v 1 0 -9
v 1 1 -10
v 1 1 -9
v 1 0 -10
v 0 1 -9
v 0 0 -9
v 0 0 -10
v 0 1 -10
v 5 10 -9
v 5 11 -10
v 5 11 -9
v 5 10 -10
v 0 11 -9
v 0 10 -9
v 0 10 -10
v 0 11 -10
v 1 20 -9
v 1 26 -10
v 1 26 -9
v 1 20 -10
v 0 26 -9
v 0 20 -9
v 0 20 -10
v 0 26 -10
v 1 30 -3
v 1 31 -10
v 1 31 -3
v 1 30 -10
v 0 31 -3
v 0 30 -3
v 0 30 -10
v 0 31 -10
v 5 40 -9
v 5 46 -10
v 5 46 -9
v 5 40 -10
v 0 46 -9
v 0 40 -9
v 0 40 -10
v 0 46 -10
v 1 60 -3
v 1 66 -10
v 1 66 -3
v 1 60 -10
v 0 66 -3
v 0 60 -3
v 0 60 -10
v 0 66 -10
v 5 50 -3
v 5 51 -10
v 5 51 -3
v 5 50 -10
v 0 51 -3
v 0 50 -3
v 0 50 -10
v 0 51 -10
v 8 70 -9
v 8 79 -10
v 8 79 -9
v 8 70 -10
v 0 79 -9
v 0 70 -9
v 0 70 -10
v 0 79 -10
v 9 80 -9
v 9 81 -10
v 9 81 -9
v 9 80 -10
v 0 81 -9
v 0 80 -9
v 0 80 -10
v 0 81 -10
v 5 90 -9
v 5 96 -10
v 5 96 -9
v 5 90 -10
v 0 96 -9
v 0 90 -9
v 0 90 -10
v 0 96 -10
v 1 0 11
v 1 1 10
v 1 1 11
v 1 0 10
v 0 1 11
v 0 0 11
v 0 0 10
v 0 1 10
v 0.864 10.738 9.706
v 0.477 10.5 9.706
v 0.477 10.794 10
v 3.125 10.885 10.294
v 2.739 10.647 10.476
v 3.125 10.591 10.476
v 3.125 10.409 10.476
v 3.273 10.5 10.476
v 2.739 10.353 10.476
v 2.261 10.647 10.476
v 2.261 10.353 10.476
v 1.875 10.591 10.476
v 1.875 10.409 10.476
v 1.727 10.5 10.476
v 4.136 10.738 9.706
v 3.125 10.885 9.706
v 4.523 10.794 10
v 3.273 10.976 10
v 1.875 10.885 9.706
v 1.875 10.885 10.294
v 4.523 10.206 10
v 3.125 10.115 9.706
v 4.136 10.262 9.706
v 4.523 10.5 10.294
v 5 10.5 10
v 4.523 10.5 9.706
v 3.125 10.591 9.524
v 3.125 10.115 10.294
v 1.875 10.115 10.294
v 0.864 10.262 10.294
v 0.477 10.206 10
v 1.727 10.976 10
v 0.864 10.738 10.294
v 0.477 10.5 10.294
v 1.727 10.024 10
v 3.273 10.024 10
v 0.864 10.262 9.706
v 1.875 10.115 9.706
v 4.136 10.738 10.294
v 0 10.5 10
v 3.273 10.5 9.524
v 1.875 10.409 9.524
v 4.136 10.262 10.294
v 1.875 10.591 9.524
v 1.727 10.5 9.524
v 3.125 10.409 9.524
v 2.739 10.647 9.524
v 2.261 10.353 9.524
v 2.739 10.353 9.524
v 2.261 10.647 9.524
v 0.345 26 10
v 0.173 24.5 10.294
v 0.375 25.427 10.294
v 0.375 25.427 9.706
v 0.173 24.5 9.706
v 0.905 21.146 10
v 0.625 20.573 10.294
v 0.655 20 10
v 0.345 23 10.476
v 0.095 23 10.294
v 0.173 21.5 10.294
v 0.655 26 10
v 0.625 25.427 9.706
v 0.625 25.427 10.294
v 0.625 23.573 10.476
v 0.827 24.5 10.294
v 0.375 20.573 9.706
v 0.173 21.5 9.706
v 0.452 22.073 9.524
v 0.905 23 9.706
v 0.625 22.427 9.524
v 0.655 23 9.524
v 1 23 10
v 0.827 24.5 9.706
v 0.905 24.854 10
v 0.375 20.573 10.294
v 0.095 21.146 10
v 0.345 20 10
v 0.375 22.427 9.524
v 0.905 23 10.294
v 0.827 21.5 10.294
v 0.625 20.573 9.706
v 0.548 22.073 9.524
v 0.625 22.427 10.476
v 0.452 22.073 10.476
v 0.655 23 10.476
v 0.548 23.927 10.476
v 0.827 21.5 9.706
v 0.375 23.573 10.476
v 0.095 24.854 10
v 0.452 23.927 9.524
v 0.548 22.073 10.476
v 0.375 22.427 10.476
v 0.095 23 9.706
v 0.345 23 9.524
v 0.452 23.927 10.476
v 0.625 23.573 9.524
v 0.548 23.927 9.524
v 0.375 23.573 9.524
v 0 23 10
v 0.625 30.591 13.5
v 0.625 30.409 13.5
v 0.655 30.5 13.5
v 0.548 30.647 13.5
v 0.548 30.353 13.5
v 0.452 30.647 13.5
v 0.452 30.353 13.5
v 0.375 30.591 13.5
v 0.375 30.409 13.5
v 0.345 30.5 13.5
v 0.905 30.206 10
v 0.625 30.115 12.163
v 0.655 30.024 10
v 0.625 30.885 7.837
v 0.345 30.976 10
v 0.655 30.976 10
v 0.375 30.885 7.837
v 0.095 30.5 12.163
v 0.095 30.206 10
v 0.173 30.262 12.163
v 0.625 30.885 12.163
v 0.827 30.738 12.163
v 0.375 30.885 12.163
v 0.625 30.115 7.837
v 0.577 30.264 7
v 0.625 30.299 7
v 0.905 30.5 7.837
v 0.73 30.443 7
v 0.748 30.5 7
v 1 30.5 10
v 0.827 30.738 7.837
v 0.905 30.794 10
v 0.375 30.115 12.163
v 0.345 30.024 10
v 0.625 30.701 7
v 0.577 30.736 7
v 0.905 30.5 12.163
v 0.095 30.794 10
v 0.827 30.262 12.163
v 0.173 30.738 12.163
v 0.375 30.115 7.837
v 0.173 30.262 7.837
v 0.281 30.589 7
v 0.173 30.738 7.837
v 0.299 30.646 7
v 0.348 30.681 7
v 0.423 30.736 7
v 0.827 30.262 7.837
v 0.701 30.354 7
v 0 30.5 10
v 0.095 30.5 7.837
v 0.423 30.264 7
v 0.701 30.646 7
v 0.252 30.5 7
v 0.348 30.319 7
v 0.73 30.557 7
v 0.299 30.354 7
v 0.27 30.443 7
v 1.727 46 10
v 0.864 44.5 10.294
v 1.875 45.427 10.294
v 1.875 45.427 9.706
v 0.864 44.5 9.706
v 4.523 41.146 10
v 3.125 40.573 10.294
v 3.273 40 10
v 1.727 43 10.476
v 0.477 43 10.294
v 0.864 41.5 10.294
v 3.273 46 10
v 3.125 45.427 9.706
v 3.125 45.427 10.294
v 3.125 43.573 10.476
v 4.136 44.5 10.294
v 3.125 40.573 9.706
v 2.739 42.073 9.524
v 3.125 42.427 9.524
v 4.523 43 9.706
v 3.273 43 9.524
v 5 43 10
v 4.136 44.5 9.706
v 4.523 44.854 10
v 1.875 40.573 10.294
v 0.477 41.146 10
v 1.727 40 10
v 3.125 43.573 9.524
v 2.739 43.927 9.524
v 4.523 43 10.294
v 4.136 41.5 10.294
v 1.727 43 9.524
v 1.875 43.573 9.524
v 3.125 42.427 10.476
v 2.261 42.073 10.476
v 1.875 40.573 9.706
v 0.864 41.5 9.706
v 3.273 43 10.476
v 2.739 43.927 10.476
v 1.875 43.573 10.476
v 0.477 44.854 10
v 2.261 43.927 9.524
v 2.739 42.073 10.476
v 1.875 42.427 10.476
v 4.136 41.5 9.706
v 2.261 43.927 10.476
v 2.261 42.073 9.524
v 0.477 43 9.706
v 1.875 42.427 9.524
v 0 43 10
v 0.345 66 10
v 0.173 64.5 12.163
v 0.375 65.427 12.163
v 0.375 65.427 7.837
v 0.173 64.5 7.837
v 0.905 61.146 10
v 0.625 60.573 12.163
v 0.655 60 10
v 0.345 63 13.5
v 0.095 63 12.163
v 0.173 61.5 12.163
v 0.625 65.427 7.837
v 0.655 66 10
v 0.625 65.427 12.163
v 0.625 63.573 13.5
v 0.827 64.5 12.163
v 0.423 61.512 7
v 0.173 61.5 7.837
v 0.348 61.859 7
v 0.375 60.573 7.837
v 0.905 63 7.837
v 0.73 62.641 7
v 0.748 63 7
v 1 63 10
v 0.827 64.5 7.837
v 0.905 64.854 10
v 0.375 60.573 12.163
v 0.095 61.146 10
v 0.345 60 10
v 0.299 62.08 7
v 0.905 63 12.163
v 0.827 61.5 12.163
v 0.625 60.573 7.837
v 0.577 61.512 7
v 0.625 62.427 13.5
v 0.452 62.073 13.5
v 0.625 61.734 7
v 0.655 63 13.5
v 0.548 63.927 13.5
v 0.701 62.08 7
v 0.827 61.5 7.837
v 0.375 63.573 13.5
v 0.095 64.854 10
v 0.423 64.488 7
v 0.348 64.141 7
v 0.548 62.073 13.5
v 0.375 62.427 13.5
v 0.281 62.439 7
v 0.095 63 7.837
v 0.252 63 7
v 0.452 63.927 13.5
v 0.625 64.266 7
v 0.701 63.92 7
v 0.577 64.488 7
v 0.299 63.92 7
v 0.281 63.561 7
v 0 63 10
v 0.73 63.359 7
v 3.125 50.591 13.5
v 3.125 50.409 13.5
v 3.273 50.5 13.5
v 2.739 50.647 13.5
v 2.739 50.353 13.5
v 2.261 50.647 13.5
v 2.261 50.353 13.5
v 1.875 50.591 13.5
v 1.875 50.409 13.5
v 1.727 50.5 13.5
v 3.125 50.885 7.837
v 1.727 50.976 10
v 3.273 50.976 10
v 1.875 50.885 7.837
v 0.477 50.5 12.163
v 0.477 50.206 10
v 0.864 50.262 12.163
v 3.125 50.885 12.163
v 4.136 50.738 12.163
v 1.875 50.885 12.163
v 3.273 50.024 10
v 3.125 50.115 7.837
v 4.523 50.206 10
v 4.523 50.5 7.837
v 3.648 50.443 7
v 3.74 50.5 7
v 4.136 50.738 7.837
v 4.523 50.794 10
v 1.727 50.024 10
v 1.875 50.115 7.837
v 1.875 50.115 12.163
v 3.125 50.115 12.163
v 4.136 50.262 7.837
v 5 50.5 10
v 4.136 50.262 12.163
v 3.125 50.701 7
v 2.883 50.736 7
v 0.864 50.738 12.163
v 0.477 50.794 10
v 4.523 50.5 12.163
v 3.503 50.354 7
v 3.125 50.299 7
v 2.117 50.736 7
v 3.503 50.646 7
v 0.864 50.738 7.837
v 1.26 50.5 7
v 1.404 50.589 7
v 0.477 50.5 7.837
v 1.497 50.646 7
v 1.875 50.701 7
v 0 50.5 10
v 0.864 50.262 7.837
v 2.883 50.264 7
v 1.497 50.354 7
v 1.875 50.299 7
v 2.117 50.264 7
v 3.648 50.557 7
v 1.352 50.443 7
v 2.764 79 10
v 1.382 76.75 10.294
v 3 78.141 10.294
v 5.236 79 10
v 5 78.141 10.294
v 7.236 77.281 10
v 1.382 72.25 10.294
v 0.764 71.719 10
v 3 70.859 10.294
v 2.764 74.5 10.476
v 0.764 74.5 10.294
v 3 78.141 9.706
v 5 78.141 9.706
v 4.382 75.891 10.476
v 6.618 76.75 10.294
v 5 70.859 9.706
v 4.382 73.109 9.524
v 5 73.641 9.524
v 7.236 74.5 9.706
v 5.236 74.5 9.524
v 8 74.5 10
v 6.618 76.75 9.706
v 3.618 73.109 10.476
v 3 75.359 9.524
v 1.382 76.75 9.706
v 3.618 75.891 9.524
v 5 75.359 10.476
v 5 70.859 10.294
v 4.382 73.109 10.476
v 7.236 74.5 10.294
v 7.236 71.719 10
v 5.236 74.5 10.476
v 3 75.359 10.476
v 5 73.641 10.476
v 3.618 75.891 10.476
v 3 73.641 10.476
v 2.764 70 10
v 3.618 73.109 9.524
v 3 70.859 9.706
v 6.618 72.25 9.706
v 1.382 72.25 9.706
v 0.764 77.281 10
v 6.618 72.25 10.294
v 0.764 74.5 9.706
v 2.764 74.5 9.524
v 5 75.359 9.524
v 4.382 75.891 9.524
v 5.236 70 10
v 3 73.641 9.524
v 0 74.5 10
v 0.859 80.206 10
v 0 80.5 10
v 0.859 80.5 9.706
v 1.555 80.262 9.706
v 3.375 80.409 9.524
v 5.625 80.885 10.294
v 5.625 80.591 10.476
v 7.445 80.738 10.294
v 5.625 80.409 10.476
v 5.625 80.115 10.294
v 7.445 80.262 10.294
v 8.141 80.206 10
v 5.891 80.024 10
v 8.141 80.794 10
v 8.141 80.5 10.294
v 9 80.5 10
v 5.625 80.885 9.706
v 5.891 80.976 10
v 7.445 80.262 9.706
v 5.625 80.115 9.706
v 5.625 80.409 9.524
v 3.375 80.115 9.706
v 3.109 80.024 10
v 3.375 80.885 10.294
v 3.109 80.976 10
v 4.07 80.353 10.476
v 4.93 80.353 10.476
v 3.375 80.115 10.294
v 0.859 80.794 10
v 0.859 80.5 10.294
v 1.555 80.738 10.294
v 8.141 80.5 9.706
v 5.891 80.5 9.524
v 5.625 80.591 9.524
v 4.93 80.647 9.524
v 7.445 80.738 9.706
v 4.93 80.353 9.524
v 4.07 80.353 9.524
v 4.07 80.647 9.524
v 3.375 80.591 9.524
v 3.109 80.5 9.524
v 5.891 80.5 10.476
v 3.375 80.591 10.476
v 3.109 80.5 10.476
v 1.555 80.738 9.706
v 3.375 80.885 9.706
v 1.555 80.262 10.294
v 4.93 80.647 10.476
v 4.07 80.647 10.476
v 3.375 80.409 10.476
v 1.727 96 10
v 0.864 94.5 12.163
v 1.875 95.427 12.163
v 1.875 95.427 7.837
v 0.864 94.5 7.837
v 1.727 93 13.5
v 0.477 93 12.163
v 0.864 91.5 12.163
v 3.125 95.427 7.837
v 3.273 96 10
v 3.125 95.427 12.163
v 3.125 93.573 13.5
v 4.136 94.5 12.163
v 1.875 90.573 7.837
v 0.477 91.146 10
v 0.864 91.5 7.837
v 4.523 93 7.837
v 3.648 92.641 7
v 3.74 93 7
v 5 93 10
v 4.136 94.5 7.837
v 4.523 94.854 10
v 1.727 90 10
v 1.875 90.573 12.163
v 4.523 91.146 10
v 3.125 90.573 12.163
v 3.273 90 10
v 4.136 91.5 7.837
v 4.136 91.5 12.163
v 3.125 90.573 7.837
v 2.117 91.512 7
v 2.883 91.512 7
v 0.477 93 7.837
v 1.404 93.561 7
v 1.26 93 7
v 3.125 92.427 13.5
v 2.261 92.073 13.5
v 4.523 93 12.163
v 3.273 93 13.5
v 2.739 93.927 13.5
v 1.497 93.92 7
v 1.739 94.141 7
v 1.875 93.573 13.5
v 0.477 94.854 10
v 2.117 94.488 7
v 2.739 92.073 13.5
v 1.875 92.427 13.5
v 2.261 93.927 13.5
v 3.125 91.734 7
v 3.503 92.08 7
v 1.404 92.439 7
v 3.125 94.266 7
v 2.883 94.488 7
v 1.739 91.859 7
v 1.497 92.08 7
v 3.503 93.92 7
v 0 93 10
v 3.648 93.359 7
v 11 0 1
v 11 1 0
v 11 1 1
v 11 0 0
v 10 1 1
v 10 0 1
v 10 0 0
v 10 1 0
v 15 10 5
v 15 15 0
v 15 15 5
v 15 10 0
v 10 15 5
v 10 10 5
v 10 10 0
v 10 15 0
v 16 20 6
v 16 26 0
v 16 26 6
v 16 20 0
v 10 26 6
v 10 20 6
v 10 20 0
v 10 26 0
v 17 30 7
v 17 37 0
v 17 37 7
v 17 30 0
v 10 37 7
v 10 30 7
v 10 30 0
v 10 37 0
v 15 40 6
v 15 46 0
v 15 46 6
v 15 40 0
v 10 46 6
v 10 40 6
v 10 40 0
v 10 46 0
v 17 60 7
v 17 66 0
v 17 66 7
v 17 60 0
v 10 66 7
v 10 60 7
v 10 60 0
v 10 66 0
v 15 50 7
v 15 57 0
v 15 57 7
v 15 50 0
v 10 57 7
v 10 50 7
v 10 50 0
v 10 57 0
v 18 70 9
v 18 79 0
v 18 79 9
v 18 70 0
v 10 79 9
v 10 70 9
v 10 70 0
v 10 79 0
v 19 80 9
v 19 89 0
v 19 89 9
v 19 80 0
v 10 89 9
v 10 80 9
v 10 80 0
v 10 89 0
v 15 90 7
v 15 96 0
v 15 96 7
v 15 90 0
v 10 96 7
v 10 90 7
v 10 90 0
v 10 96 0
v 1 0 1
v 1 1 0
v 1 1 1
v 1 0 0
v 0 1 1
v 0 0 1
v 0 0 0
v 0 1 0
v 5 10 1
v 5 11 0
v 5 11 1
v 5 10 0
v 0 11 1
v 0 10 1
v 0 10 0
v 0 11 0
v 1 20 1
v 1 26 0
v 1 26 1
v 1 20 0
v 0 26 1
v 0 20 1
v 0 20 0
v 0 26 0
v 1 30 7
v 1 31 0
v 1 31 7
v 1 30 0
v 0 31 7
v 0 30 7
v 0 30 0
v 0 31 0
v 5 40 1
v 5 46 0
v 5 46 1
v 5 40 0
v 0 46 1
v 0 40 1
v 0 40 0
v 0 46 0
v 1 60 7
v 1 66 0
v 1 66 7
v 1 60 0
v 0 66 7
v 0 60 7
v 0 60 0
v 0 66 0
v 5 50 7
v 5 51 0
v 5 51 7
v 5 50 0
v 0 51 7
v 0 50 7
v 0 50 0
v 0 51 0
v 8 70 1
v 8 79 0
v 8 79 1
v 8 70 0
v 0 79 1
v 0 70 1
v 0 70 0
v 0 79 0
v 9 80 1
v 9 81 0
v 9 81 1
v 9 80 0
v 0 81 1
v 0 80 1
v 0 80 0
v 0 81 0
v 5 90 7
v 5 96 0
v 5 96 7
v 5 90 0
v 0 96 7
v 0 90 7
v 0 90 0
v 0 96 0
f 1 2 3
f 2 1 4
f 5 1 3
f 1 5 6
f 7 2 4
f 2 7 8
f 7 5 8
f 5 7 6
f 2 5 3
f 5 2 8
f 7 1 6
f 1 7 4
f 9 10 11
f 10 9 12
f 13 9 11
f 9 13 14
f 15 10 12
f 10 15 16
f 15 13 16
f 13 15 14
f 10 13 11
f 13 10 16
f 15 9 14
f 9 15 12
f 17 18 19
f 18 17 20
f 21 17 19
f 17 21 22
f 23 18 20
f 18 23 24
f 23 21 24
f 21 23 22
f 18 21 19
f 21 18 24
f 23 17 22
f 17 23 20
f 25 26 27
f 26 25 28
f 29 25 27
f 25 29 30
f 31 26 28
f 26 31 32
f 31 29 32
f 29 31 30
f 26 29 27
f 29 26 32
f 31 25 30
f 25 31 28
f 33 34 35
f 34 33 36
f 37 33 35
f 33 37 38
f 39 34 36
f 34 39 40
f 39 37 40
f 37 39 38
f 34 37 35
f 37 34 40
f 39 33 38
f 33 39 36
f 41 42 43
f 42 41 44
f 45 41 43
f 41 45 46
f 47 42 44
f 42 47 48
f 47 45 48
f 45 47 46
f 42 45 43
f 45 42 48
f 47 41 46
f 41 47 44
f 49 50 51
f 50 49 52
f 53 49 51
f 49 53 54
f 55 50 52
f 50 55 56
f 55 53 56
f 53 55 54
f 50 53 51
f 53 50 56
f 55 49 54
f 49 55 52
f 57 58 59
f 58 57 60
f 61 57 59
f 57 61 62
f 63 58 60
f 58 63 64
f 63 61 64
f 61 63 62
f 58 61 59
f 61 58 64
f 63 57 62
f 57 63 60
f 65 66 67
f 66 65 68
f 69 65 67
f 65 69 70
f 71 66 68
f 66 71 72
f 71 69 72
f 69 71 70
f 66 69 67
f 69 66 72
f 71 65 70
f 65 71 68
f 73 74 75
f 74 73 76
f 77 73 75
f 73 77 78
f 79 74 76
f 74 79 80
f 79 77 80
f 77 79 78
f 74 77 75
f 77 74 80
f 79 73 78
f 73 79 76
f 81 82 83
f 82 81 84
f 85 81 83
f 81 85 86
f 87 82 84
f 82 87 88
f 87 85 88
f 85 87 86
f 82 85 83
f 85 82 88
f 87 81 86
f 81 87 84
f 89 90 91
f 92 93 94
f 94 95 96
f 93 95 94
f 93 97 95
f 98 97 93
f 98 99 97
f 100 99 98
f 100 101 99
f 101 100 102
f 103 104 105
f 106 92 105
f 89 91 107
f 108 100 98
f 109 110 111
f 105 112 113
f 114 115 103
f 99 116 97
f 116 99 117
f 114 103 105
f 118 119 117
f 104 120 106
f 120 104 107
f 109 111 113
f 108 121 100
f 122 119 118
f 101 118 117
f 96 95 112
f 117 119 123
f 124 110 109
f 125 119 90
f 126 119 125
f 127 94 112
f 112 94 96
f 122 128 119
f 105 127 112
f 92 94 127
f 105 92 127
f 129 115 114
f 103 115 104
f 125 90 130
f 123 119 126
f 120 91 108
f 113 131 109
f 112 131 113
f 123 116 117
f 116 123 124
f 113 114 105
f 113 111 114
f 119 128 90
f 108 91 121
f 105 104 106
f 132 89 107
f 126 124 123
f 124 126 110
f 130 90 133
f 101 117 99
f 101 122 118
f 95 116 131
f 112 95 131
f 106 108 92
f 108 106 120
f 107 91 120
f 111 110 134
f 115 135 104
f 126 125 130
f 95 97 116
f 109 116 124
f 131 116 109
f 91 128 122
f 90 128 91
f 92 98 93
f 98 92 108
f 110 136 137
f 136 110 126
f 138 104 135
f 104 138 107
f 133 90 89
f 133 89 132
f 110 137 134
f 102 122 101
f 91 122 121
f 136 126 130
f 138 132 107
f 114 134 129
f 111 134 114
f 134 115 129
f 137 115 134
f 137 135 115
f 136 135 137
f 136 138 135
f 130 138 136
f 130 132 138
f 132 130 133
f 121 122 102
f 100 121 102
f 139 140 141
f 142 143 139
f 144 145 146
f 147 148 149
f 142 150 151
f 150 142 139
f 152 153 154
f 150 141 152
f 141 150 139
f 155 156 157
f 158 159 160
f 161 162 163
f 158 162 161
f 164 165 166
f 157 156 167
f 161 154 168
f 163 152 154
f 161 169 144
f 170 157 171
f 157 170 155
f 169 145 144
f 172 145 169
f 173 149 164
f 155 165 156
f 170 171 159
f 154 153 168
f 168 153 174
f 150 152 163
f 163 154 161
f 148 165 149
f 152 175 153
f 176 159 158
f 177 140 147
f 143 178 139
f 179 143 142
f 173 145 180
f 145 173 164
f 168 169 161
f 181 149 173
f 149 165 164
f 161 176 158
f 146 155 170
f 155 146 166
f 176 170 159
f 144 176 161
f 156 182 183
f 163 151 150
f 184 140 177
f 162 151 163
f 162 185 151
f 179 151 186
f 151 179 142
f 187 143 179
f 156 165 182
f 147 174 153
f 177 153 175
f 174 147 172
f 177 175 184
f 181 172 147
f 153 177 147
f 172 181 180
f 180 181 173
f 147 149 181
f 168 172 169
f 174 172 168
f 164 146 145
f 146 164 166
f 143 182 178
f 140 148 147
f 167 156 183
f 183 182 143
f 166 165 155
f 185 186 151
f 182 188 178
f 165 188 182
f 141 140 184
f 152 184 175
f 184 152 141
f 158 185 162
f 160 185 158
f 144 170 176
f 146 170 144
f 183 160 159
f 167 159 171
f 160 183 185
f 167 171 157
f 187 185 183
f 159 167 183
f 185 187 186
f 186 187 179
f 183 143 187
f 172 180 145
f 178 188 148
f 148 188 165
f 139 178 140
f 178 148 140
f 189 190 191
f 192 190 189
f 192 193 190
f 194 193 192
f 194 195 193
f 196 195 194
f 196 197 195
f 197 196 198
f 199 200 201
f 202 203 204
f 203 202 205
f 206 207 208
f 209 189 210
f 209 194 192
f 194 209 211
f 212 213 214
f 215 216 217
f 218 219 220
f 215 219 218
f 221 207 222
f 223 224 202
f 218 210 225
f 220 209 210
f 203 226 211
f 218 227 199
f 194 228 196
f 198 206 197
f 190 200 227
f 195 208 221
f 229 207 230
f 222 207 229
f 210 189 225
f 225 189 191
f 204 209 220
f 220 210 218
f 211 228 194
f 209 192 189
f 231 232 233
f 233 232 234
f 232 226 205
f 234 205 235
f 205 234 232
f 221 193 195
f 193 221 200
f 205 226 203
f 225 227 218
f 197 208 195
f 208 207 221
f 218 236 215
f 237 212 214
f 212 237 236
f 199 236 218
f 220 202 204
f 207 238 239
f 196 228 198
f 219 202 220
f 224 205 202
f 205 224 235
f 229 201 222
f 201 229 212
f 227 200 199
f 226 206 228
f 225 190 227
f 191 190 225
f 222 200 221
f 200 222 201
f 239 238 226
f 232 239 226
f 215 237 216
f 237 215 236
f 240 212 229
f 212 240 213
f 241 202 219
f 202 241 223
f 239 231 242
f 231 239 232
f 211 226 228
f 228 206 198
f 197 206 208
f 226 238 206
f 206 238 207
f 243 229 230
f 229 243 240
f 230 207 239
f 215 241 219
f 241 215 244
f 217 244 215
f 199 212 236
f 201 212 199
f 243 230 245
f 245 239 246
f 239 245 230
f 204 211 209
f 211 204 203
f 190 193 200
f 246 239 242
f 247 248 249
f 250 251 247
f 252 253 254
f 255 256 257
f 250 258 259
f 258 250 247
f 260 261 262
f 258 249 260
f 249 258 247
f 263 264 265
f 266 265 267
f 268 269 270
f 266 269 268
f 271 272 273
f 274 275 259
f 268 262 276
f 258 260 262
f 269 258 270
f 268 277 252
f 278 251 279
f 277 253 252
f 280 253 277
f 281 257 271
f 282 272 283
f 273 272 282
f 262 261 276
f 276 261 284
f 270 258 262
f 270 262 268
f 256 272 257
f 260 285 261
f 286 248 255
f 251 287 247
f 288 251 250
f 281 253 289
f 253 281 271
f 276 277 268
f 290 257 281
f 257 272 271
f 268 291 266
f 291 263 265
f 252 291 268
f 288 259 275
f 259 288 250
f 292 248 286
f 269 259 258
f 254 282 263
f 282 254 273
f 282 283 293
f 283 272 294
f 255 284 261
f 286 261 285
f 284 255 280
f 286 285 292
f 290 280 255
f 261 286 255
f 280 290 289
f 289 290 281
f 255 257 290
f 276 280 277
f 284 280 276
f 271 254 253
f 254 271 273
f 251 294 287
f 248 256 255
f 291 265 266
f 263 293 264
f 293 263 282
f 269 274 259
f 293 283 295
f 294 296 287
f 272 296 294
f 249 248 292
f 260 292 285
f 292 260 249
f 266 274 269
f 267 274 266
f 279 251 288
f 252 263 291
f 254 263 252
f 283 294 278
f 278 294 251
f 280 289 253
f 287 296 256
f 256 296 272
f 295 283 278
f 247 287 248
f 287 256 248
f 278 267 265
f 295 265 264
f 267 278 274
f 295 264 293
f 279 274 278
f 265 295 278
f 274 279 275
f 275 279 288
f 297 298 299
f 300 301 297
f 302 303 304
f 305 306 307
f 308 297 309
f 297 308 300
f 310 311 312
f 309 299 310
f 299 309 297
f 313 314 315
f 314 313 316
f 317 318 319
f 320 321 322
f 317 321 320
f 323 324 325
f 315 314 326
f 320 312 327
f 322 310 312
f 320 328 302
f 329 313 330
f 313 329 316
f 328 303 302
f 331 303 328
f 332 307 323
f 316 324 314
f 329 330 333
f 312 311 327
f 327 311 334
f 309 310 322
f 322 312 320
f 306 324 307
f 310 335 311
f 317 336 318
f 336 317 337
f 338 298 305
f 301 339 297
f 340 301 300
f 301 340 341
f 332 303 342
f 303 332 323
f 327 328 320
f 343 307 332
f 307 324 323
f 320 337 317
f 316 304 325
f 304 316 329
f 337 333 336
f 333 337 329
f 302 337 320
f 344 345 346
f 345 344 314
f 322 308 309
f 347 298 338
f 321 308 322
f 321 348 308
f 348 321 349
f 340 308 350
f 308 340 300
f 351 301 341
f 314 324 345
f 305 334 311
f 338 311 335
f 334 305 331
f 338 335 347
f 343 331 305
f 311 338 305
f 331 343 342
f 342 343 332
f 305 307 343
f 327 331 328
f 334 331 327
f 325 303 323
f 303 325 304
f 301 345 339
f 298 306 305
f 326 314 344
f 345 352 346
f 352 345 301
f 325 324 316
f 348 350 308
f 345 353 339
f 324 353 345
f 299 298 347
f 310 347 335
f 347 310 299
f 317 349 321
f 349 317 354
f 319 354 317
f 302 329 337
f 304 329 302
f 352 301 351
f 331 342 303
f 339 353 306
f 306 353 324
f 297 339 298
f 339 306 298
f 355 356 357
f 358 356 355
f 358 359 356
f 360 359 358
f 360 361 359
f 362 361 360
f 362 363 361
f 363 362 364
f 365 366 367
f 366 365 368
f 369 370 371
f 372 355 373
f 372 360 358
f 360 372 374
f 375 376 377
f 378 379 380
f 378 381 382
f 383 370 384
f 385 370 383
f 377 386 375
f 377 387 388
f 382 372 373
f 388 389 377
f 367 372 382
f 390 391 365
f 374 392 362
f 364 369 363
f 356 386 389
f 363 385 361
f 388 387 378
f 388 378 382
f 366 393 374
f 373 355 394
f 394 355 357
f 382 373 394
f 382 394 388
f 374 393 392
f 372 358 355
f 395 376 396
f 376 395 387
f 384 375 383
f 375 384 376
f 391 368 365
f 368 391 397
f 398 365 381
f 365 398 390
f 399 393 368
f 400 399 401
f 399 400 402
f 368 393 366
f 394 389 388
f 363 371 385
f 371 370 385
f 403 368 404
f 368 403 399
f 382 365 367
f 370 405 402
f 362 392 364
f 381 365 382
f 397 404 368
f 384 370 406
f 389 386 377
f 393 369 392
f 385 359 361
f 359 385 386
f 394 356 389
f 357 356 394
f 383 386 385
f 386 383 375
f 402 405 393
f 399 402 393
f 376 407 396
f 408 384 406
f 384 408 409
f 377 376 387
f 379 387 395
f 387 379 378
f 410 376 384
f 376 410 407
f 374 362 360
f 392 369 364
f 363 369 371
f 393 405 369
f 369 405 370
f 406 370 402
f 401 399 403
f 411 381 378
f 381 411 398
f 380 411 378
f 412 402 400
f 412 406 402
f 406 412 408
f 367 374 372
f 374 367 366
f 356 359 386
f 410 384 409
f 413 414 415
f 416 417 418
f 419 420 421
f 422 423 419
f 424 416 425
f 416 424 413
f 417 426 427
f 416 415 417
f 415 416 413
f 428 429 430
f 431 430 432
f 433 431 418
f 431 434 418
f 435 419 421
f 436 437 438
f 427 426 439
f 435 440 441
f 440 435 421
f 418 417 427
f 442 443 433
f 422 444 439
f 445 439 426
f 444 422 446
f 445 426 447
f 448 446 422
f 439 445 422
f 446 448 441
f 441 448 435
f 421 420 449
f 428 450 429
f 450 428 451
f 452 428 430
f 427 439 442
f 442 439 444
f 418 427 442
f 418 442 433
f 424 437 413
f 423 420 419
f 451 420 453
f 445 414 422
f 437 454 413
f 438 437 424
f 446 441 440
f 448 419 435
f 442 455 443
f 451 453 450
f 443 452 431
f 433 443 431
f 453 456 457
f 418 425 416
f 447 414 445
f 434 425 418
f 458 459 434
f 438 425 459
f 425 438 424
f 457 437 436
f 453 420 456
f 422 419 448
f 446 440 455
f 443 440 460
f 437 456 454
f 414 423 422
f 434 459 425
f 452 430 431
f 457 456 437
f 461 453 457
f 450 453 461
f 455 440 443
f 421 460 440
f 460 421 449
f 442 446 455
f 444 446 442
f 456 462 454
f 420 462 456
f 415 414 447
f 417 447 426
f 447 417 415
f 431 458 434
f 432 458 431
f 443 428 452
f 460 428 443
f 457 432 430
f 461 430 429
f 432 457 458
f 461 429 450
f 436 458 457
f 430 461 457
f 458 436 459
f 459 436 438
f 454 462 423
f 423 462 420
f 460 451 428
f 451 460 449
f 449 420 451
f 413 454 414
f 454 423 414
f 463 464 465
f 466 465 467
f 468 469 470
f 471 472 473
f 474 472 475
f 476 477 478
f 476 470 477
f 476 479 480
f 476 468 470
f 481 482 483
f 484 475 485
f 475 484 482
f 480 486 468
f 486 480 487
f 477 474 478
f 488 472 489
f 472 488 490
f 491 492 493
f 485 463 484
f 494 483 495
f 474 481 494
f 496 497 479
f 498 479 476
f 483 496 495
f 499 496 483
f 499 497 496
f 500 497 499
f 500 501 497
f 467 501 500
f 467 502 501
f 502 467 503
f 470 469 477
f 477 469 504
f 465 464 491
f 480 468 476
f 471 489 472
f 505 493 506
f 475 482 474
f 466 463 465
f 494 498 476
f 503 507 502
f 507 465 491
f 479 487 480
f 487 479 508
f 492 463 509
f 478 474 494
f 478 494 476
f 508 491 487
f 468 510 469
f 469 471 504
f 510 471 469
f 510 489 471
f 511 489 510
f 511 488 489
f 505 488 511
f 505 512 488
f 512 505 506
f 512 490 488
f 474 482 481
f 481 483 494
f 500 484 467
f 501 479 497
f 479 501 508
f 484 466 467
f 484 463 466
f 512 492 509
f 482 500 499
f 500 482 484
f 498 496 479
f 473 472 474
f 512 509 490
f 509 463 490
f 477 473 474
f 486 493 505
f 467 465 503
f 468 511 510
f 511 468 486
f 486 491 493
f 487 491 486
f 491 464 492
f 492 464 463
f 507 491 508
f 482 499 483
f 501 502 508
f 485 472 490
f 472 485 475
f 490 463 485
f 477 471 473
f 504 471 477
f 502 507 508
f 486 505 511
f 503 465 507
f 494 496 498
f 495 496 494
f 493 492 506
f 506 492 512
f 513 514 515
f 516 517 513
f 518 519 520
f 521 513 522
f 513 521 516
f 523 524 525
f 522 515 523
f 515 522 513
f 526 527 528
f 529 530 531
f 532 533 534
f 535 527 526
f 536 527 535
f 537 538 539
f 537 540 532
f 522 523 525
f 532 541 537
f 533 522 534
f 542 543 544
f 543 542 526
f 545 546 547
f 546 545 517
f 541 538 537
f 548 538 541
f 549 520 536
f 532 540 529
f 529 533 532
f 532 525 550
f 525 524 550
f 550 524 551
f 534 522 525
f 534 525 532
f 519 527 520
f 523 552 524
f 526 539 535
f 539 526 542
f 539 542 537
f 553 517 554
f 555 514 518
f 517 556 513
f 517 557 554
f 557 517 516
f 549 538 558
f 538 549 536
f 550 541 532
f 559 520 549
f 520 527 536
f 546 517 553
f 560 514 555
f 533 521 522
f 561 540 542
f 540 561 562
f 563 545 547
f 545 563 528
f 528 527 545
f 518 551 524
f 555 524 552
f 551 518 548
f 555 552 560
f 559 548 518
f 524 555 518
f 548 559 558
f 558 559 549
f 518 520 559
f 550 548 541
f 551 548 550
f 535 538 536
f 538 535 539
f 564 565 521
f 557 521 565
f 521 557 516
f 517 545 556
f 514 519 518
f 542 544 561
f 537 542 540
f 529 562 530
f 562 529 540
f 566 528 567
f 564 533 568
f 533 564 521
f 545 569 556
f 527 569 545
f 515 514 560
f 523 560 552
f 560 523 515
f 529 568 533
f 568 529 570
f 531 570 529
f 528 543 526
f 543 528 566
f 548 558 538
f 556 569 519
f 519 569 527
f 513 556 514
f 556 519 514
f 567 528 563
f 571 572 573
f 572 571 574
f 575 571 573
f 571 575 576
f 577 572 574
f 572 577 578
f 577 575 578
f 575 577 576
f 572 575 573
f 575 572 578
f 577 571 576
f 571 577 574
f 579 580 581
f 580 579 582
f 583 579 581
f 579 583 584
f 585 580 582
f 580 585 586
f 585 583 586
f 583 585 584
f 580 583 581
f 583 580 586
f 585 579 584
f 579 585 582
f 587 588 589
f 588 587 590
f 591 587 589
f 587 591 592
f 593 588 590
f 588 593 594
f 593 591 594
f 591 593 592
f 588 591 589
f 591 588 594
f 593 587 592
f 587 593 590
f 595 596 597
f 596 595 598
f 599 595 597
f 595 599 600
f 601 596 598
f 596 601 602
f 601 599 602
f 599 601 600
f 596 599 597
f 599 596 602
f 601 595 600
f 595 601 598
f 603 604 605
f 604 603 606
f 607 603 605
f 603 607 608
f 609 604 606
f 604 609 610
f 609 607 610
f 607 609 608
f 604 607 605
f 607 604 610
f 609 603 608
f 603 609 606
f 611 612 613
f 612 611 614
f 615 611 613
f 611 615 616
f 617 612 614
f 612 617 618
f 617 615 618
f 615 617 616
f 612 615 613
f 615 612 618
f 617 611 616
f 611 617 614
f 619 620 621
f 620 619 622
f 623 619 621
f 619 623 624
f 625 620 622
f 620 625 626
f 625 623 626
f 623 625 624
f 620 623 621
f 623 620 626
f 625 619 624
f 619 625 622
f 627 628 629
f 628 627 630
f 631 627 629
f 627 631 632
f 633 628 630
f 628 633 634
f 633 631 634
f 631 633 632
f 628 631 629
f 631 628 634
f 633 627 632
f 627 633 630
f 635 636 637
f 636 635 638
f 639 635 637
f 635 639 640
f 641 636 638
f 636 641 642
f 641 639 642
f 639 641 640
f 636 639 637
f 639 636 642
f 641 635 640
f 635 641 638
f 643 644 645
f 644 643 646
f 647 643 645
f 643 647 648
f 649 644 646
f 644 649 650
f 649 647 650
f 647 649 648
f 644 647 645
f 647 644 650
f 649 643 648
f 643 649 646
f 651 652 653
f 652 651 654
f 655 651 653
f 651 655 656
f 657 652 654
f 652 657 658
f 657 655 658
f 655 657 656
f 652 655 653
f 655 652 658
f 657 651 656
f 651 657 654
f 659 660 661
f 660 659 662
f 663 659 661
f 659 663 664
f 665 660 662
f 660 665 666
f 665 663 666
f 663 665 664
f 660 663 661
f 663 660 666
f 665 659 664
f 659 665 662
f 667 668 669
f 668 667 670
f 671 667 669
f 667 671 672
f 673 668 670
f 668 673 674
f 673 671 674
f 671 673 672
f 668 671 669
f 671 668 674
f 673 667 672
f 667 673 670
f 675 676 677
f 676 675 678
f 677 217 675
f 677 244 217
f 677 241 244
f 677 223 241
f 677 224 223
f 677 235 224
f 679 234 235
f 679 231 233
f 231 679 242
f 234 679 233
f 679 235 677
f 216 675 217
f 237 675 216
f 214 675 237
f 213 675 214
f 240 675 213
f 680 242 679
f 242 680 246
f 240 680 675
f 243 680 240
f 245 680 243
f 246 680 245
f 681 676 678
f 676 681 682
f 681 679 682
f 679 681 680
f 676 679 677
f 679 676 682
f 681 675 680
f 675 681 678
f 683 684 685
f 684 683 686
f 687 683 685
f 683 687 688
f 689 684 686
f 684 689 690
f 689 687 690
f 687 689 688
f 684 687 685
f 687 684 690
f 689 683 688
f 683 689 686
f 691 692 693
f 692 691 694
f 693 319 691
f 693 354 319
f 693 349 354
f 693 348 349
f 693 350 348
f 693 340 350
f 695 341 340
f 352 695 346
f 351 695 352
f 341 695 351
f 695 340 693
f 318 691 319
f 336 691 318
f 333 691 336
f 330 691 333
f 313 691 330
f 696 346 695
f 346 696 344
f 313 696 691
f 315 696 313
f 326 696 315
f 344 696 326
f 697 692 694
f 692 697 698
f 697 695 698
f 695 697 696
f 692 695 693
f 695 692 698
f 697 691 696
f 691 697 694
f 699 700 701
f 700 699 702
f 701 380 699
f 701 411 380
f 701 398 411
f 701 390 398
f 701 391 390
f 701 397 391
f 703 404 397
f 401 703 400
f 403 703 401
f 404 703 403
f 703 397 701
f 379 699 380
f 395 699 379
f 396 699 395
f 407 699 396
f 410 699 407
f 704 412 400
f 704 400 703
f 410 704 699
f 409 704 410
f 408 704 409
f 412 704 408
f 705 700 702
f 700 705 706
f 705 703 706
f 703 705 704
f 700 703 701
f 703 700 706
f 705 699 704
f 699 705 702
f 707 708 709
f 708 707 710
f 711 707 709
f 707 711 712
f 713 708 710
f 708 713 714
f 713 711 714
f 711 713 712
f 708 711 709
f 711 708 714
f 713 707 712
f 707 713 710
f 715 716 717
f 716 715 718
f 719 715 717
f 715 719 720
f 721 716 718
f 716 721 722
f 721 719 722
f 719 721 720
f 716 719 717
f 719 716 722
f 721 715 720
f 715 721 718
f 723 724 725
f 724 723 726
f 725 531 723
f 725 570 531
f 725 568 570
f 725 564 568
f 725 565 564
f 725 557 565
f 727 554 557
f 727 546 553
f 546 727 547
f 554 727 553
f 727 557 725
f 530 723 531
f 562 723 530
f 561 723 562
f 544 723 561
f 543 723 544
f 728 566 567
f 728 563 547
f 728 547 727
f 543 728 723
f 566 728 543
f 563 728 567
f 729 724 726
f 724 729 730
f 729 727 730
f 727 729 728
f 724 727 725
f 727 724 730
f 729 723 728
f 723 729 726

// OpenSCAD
// bottom row = reference
// middle row = should match reference
// top row = should be inscribed in middle row in 'top' view
// back row = should be all cubes auto-scaled up

$fn=10;

color("red") {
translate([0, 0,-10]) cube(); 
translate([0,10,-10]) cube([5,1,1]);
translate([0,20,-10]) cube([1,6,1]);
translate([0,30,-10]) cube([1,1,7]);
translate([0,40,-10]) cube([5,6,1]); 
translate([0,60,-10]) cube([1,6,7]);
translate([0,50,-10]) cube([5,1,7]);
translate([0,70,-10]) cube([8,9,1]);
translate([0,80,-10]) cube([9,1,1]);
translate([0,90,-10]) cube([5,6,1]);
}

translate([0, 0,0]) cube(); 
translate([0,10,0]) resize([5,0,0]) cube(); 
translate([0,20,0]) resize([0,6,0]) cube(); 
translate([0,30,0]) resize([0,0,7]) cube(); 
translate([0,40,0]) resize([5,6,0]) cube(); 
translate([0,60,0]) resize([0,6,7]) cube(); 
translate([0,50,0]) resize([5,0,7]) cube(); 
translate([0,70,0]) resize([8,9]) cube(); 
translate([0,80,0]) resize([9]) cube(); 
translate([0,90,0]) resize([5,6,7]) cube(); 

color("blue"){
translate([0, 0,10]) cube(); 
translate([2.5,10.5,10]) resize([5,0,0]) sphere(0.5); 
translate([0.5,23,10]) resize([0,6,0]) sphere(0.5); 
translate([0.5,30.5,10]) resize([0,0,7]) sphere(0.5); 
translate([2.5,43,10]) resize([5,6,0]) sphere(0.5); 
translate([0.5,63,10]) resize([0,6,7]) sphere(0.5); 
translate([2.5,50.5,10]) resize([5,0,7]) sphere(0.5); 
translate([4,74.5,10]) resize([8,9]) sphere(0.5); 
translate([4.5,80.5,10]) resize([9]) sphere(0.5); 
translate([2.5,93,10]) resize([5,6,7]) sphere(0.5); 
}

color("green"){
translate([10, 0, 0]) cube(); 
translate([10,10,0]) resize([5,0,0],auto=true) cube(); 
translate([10,20,0]) resize([0,6,0],auto=true) cube(); 
translate([10,30,0]) resize([0,0,7],auto=true) cube(); 
translate([10,40,0]) resize([5,6,0],true) cube(); 
translate([10,60,0]) resize([0,6,7],auto=true) cube(); 
translate([10,50,0]) resize([5,0,7],true) cube(); 
translate([10,70,0]) resize([8,9],auto=true) cube(); 
translate([10,80,0]) resize([9],true) cube(); 
translate([10,90,0]) resize([5,6,7],auto=true) cube(); 
}
